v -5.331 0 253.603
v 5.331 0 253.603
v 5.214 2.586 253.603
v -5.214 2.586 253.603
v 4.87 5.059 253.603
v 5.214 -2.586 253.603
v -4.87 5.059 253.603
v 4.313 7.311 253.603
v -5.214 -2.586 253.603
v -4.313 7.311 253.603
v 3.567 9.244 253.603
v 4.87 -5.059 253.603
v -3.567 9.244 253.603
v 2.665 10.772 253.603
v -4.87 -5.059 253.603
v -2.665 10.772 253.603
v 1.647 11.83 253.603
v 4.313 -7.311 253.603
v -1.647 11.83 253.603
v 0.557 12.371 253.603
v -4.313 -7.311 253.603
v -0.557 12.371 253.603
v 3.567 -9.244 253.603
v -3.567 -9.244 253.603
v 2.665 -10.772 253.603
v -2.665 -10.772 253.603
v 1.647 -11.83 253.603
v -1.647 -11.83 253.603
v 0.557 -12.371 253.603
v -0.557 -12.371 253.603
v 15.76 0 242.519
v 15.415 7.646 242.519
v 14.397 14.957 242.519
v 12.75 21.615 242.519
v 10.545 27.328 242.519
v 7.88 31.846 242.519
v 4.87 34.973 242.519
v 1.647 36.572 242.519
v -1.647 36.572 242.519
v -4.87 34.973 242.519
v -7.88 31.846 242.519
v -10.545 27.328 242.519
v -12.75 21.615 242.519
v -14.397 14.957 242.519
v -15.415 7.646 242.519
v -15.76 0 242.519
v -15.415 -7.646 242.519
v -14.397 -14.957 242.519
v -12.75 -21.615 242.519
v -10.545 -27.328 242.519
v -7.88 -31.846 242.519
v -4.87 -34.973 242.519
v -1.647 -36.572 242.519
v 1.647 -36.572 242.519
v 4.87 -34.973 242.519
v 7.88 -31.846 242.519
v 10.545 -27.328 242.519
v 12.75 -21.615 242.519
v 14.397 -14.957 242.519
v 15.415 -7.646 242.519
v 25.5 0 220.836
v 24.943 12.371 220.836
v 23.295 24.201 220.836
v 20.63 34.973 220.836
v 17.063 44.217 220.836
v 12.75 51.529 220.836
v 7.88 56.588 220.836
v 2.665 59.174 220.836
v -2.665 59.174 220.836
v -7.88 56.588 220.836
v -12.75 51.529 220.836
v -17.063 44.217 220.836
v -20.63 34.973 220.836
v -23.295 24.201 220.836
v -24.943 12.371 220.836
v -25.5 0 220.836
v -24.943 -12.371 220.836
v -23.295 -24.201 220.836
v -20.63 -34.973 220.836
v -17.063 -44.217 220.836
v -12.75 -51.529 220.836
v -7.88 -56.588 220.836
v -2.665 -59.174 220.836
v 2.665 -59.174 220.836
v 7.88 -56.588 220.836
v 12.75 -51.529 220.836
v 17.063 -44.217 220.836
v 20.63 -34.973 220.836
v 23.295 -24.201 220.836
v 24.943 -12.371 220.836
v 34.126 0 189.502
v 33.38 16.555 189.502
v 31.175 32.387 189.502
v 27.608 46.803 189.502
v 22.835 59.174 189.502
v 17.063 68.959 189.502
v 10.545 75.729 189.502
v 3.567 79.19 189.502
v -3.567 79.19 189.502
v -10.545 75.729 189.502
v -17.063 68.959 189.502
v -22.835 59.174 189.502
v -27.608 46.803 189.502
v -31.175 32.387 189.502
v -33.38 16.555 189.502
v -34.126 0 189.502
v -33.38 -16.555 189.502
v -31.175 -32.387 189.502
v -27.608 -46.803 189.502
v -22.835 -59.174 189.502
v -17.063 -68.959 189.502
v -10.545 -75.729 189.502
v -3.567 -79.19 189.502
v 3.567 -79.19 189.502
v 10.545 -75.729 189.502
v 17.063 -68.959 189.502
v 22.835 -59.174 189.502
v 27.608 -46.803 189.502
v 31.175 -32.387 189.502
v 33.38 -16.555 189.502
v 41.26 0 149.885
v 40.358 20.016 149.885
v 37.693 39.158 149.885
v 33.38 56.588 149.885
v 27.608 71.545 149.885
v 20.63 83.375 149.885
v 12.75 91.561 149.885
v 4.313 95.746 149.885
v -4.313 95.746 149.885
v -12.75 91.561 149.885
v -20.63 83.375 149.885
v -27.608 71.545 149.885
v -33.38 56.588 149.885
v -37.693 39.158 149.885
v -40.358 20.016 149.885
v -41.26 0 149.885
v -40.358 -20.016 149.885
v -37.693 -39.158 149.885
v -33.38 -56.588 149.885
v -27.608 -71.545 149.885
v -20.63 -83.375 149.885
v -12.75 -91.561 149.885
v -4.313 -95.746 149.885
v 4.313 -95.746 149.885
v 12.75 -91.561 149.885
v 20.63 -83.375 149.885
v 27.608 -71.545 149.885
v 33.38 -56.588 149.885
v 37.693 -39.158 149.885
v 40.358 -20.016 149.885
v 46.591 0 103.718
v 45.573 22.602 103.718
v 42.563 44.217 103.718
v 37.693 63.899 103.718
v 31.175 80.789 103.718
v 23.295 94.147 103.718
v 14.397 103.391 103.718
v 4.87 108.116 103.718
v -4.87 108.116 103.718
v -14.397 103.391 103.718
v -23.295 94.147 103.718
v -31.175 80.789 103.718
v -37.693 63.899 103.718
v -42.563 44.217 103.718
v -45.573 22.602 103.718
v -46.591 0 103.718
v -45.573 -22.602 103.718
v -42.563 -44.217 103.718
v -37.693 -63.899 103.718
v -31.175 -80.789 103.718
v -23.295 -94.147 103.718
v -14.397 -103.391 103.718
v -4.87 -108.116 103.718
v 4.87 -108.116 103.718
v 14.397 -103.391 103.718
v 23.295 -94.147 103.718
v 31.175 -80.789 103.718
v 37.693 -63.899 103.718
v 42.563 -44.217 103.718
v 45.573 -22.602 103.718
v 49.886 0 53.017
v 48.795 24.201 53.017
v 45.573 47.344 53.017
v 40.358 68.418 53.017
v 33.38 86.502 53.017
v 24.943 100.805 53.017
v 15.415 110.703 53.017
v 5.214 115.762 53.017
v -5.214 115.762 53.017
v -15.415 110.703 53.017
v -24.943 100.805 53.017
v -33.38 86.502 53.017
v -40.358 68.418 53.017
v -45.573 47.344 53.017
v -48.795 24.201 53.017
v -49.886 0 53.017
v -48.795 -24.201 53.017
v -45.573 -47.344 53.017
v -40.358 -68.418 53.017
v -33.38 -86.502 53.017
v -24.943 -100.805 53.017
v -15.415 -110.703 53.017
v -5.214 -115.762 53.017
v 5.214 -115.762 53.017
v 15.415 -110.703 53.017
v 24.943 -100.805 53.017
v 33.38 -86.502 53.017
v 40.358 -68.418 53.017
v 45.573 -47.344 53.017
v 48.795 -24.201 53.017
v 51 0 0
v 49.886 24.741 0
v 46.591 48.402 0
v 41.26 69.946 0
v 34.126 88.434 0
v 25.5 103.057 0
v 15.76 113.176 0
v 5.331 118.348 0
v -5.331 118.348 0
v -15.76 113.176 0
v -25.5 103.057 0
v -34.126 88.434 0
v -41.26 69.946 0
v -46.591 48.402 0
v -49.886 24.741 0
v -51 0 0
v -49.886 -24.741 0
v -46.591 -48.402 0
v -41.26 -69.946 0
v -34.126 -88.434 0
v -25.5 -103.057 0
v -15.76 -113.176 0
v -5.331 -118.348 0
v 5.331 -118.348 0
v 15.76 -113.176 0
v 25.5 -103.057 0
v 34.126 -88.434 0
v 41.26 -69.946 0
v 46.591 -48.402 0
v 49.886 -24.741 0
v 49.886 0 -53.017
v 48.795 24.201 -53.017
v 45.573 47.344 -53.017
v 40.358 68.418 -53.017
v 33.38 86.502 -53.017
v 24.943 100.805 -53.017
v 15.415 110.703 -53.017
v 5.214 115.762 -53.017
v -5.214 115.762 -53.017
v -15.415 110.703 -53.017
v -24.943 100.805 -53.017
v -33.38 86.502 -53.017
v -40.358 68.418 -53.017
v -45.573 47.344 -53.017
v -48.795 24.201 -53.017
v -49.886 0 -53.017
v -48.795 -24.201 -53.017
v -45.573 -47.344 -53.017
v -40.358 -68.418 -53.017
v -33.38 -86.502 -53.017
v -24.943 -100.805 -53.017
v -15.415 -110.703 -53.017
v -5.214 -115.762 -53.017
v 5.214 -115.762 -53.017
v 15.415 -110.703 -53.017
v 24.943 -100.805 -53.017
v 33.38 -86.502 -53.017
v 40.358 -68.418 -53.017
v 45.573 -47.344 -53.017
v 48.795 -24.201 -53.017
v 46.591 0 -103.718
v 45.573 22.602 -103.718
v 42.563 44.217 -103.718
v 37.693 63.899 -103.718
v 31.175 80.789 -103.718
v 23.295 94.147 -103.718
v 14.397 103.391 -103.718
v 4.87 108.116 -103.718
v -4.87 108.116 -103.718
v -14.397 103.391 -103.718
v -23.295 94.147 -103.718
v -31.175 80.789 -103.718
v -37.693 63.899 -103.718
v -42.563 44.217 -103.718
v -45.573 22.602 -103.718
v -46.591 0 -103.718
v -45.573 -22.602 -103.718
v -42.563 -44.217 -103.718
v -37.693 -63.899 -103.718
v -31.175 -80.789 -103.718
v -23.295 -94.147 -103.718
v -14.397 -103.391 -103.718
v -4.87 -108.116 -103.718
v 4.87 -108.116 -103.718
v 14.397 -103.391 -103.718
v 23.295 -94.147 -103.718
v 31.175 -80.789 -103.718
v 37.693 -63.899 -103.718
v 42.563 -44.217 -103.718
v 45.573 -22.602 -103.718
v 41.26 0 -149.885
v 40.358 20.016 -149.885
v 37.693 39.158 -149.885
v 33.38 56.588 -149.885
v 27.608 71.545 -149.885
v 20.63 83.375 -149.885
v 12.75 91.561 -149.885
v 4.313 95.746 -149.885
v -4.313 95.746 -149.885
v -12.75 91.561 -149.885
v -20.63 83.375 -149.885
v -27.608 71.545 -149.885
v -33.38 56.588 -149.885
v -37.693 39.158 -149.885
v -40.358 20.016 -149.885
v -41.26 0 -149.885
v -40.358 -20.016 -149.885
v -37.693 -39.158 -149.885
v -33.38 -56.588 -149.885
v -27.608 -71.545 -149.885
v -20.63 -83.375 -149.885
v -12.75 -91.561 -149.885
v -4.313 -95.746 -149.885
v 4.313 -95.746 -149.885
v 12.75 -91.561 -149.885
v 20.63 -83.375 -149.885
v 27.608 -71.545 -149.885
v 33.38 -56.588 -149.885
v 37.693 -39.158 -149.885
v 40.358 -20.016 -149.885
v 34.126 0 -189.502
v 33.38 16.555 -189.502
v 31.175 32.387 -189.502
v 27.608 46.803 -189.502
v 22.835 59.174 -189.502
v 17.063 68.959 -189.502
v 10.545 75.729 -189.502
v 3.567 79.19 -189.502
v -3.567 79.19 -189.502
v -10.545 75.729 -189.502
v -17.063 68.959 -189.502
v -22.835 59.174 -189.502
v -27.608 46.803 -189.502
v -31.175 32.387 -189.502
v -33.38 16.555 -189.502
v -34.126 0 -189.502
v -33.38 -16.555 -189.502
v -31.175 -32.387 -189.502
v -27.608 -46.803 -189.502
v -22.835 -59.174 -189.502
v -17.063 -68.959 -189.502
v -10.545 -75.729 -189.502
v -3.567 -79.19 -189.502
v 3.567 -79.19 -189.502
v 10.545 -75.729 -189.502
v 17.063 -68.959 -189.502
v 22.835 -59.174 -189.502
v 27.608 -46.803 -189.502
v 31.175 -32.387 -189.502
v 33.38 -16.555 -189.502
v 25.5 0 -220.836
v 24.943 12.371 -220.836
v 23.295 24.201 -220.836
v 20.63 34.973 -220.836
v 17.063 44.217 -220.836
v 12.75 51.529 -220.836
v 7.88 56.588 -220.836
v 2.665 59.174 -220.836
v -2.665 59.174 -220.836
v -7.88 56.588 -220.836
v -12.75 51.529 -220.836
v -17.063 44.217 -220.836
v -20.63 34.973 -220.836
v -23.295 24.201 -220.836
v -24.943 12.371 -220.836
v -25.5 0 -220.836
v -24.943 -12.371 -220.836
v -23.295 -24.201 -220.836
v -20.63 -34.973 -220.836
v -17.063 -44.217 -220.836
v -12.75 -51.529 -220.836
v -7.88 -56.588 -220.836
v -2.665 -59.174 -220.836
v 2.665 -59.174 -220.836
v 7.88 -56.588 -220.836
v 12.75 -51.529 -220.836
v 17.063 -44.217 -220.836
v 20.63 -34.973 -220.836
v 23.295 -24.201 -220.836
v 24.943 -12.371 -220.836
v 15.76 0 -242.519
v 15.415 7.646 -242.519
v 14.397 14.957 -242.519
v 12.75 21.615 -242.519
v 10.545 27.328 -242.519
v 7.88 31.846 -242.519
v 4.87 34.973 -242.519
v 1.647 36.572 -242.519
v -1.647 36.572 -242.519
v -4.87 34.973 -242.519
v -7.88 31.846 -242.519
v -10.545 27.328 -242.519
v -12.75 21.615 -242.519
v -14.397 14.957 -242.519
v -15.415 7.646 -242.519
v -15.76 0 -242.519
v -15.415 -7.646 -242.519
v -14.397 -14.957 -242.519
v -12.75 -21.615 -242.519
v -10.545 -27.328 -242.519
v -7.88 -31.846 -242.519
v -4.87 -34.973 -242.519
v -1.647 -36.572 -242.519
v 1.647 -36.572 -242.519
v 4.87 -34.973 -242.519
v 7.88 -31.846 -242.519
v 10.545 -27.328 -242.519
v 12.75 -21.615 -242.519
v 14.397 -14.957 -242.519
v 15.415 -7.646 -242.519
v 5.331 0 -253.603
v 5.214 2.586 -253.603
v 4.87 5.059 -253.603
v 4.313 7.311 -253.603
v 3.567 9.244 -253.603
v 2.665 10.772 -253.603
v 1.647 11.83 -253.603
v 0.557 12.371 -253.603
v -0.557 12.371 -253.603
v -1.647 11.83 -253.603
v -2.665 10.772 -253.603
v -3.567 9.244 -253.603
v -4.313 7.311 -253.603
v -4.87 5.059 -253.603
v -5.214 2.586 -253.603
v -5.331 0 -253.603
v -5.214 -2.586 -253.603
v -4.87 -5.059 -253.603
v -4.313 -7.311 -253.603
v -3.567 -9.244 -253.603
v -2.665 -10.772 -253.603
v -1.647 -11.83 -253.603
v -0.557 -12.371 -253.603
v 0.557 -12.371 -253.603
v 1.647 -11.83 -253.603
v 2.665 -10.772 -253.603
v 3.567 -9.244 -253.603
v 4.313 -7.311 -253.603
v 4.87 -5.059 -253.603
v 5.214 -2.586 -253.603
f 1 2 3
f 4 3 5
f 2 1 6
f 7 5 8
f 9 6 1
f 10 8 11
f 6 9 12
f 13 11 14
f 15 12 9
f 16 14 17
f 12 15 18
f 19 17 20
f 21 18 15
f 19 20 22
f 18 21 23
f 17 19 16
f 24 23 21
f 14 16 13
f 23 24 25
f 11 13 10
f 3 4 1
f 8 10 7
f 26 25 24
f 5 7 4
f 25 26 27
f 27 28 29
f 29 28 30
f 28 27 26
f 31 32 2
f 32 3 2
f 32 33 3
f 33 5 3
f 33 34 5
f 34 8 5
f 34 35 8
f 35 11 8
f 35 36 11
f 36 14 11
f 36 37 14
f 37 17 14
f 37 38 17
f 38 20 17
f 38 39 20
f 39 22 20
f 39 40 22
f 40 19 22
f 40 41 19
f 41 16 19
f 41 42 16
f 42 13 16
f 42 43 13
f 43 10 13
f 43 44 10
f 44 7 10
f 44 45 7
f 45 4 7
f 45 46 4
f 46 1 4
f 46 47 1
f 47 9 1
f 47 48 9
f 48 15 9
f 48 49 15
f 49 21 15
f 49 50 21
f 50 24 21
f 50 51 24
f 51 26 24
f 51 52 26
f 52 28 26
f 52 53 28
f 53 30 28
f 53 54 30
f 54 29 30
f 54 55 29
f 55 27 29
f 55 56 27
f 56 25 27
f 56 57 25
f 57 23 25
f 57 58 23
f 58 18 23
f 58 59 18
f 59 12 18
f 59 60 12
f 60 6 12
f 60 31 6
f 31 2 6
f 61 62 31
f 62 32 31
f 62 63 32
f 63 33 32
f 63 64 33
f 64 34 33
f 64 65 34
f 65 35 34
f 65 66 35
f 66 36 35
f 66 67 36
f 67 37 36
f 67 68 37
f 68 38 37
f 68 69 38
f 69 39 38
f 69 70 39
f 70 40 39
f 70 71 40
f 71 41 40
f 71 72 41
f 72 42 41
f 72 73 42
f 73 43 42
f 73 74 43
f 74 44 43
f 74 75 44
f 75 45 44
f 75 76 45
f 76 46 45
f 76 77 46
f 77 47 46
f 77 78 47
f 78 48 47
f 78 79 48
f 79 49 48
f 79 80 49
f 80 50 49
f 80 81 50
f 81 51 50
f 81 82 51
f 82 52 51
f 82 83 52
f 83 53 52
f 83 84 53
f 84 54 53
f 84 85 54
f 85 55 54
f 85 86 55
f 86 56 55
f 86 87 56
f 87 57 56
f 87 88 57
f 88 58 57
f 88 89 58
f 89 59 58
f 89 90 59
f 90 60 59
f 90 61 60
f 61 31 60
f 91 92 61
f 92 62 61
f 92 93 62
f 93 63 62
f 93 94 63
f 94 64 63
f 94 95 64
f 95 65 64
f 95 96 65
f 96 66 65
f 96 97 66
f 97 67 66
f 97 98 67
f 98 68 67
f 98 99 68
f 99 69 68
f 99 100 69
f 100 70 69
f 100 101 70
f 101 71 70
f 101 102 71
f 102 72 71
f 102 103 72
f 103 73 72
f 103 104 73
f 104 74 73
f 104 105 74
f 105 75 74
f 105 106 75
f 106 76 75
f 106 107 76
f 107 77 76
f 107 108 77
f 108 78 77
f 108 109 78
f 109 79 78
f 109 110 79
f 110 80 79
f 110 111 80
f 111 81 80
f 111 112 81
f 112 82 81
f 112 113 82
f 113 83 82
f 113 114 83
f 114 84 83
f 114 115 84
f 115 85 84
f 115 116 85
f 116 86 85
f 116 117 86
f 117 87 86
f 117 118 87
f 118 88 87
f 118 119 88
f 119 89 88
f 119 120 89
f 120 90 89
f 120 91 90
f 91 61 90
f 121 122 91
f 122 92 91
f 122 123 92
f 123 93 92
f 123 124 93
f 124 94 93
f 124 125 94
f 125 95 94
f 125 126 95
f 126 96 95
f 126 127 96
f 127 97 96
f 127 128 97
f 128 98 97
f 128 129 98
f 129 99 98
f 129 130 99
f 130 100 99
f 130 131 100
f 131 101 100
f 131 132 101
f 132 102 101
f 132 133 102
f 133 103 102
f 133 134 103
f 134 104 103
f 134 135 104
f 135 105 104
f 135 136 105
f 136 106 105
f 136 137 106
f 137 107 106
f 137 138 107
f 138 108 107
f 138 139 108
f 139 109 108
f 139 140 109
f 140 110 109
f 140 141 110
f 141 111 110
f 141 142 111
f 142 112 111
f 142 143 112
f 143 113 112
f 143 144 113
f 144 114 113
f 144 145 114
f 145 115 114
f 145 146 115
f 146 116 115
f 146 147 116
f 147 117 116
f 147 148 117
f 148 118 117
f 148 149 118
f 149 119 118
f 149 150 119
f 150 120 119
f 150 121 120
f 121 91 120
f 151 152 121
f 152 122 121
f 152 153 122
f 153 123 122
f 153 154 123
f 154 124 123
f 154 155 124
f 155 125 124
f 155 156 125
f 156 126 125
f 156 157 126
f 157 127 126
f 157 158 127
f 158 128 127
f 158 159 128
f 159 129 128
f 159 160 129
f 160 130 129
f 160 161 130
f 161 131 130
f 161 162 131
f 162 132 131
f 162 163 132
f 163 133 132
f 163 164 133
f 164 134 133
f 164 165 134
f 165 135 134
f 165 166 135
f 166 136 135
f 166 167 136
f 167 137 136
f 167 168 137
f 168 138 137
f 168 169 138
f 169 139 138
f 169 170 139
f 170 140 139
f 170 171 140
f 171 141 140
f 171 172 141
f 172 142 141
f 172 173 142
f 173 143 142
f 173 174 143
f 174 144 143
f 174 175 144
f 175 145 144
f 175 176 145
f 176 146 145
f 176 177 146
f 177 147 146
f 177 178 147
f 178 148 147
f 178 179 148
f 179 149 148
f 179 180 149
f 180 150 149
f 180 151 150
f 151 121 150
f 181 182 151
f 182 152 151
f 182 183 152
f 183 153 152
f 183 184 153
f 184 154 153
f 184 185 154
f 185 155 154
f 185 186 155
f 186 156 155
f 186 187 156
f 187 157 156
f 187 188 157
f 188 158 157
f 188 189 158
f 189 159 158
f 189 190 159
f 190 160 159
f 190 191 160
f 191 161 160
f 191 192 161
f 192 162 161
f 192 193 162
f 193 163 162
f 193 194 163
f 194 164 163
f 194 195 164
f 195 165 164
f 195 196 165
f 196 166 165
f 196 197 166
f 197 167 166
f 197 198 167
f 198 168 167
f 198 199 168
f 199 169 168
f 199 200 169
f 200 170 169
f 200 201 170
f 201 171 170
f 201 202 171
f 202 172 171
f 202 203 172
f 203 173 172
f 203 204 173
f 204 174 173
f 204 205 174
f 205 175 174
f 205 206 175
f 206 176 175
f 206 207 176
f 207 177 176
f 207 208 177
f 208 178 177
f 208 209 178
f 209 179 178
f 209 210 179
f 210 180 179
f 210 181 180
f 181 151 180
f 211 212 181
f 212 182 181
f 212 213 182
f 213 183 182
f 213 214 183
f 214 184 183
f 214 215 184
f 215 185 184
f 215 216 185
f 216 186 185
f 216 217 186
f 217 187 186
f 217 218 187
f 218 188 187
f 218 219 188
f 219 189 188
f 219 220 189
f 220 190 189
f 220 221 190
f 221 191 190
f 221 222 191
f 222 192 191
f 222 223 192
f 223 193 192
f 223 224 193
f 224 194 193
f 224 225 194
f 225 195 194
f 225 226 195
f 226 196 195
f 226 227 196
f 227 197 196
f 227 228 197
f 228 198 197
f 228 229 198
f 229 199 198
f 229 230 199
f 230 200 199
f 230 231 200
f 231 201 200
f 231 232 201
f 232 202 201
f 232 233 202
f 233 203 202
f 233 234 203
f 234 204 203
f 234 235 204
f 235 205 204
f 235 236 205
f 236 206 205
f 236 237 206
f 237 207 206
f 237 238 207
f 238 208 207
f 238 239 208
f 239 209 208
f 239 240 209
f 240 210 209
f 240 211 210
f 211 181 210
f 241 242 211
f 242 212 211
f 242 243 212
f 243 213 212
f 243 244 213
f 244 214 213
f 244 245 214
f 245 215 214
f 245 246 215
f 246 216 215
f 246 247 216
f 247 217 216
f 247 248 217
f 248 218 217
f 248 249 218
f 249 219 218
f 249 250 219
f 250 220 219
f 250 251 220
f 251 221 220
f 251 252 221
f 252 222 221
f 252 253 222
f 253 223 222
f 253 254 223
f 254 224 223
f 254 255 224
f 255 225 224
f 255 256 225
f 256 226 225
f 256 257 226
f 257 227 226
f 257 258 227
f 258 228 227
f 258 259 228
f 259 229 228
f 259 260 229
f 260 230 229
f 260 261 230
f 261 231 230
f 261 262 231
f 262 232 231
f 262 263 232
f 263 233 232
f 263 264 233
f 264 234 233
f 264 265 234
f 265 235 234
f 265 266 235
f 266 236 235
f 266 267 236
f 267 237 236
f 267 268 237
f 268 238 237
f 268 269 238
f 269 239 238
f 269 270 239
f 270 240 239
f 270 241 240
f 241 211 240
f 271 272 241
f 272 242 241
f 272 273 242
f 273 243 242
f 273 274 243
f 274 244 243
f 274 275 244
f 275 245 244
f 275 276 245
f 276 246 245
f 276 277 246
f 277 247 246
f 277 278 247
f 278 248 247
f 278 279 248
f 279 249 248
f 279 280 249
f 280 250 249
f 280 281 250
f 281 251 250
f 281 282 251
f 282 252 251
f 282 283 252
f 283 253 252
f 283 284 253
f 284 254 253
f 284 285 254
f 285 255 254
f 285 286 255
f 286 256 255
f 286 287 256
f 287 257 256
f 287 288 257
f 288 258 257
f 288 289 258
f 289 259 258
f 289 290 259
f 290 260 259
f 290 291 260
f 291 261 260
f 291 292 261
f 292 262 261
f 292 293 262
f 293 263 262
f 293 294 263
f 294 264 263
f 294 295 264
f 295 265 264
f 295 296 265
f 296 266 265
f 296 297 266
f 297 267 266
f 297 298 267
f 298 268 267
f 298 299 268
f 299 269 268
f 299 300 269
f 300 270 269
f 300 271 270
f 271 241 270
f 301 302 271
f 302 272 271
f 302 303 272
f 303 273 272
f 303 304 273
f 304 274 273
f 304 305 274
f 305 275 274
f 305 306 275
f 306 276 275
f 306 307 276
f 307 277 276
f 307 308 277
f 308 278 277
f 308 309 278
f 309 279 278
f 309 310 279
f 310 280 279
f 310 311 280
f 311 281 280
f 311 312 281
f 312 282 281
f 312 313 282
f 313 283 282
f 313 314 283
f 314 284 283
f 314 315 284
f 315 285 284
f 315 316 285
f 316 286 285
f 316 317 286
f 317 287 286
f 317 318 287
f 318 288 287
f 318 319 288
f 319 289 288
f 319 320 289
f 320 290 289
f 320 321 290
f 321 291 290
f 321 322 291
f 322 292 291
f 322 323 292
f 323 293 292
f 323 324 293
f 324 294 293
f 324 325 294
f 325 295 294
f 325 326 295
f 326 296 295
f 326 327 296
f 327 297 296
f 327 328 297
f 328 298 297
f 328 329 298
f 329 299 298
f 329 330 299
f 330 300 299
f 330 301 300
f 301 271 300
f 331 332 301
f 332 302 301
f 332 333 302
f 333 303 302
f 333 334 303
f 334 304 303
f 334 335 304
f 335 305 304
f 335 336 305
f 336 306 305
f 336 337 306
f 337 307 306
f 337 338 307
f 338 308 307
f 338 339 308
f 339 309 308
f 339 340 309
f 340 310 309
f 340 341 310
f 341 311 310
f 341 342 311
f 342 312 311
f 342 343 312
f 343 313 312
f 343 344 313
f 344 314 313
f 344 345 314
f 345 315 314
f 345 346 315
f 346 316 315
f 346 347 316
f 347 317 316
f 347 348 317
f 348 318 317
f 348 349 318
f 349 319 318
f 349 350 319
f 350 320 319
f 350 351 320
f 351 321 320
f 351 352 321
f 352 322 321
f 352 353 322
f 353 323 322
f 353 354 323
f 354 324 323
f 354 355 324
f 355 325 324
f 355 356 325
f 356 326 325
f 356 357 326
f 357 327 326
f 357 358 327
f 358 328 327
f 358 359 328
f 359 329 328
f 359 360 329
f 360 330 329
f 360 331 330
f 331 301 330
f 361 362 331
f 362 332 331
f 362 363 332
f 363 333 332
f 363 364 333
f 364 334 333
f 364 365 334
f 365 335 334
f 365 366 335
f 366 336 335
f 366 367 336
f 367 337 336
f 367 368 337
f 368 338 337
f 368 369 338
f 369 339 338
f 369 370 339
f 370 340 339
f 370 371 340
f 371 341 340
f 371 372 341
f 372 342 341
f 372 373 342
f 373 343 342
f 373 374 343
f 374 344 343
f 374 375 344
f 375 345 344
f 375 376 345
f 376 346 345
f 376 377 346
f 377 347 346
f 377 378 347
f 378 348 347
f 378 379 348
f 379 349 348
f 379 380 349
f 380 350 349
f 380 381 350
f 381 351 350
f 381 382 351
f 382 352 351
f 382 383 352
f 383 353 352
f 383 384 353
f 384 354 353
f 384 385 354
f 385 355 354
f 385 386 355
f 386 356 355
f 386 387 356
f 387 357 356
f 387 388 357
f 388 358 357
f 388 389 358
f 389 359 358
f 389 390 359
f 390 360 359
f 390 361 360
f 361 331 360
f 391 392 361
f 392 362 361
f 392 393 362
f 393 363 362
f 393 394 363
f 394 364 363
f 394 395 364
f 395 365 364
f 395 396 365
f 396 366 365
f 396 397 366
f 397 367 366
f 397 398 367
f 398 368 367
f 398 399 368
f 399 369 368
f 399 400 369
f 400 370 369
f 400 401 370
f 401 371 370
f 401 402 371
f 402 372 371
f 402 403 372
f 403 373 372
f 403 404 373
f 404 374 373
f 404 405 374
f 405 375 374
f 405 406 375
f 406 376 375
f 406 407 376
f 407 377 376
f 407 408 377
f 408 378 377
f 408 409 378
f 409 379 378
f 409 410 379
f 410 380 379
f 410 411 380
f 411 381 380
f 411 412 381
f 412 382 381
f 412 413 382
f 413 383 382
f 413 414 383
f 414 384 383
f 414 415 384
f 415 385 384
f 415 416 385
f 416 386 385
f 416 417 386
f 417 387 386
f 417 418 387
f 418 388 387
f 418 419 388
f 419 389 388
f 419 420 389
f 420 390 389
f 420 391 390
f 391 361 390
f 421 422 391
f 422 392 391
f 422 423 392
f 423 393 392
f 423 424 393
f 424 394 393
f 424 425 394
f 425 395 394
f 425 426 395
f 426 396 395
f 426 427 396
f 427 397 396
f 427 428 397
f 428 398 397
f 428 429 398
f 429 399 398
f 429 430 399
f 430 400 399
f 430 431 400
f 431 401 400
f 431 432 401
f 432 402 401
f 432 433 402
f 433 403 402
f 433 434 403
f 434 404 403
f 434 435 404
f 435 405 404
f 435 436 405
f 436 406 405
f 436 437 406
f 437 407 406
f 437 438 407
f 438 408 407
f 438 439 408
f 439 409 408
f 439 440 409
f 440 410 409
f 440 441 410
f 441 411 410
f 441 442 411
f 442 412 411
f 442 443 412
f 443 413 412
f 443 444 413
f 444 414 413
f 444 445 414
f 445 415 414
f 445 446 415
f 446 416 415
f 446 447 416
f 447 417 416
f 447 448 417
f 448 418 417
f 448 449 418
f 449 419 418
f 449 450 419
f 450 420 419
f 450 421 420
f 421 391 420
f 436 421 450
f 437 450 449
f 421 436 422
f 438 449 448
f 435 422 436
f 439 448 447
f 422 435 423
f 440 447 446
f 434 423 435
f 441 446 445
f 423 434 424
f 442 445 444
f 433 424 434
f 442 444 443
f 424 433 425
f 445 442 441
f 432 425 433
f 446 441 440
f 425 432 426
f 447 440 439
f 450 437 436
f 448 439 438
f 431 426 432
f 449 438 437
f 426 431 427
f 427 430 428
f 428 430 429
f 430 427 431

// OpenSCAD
// Generated by SolidPython 1.0.1 on 2020-07-29 00:39:25


scale(v = [3, 7, 15]) {
	sphere(r = 17);
}
/***********************************************
*********      SolidPython code:      **********
************************************************
 
# import packages: SolidPython
from solid import *
from solid.utils import *
from itertools import chain, combinations


class Resize:

    def __init__(self, scad_file):
        self.scad_file = scad_file
        #self.scad_file = import_scad(scad_file)
        # cone/cylinder param:
        self.r1 = 0
        self.r2 = 0
        self.h = 0
        # rectangular prism param:
        self.w = 0
        self.l = 0
        # ellipse param:
        self.r = 0

    # import OpenScad code (file name corresponds to shape)


    # classify shape + parameters
    def assign(self, param1, param2, param3):
        if self.scad_file == 'cone.scad':
            self.r1 = param1
            self.r2 = param2
            self.h = param3
        elif self.scad_file == 'cylinder.scad':
            self.r1 = param1
            self.r2 = param2
            self.h = param3
        elif self.scad_file == 'rectangularPrism.scad':
            self.h = param1
            self.l = param2
            self.w = param3
        else:
            self.r = param1
            self.h = param2

    # resize parameters
    def iterate(self):
        x = range(3, 20, 2)
        i = 1
        if self.scad_file == 'cone.scad':
            tempList = list(combinations(x, 2))
            for temp in tempList:
                param1 = temp[0]
                param2 = temp[1]
                filepath = 'produced_scad_files/' + 'cone' + str(param1) + '_' + str(param2) + '_' + '.scad'
                scad_render_to_file(cylinder(h=param1, r1=param2, r2=0), filepath)

        elif self.scad_file == 'cylinder.scad':
            tempList = list(combinations(x, 3))
            for temp in tempList:
                param1 = temp[0]
                param2 = temp[1]
                filepath = 'produced_scad_files/' + 'cylinder' + str(param1) + '_' + str(param2) + '_' + '.scad'
                scad_render_to_file(cylinder(h=param1, r1=param2, r2=param2), filepath)

        elif self.scad_file == 'rectangularPrism.scad':
            tempList = list(combinations(x, 3))
            for temp in tempList:
                param1 = temp[0]
                param2 = temp[1]
                param3 = temp[2]
                filepath = 'produced_scad_files/' + 'rectangularPrism' + str(param1) + '_' + str(param2) + '_' + str(
                    param3) + '.scad'
                scad_render_to_file(cube(size=(param1, param2, param3)), filepath)

        elif self.scad_file == 'ellipse.scad':
            tempList = list(combinations(x, 4))
            for temp in tempList:
                param1 = temp[0]
                param2 = temp[1]
                param3 = temp[2]
                param4 = temp[3]
                filepath = 'produced_scad_files/' + 'ellipse' + str(param1) + '_' + str(param2) + '_' + str(param3) + '_' + str(param4) + '.scad'
                scad_render_to_file(scale([param1, param2, param3])(sphere(r=param4)), filepath)

    def render_to_scadfile(self):
        scad_render_to_file(scad, 'example.scad') 
 
************************************************/
